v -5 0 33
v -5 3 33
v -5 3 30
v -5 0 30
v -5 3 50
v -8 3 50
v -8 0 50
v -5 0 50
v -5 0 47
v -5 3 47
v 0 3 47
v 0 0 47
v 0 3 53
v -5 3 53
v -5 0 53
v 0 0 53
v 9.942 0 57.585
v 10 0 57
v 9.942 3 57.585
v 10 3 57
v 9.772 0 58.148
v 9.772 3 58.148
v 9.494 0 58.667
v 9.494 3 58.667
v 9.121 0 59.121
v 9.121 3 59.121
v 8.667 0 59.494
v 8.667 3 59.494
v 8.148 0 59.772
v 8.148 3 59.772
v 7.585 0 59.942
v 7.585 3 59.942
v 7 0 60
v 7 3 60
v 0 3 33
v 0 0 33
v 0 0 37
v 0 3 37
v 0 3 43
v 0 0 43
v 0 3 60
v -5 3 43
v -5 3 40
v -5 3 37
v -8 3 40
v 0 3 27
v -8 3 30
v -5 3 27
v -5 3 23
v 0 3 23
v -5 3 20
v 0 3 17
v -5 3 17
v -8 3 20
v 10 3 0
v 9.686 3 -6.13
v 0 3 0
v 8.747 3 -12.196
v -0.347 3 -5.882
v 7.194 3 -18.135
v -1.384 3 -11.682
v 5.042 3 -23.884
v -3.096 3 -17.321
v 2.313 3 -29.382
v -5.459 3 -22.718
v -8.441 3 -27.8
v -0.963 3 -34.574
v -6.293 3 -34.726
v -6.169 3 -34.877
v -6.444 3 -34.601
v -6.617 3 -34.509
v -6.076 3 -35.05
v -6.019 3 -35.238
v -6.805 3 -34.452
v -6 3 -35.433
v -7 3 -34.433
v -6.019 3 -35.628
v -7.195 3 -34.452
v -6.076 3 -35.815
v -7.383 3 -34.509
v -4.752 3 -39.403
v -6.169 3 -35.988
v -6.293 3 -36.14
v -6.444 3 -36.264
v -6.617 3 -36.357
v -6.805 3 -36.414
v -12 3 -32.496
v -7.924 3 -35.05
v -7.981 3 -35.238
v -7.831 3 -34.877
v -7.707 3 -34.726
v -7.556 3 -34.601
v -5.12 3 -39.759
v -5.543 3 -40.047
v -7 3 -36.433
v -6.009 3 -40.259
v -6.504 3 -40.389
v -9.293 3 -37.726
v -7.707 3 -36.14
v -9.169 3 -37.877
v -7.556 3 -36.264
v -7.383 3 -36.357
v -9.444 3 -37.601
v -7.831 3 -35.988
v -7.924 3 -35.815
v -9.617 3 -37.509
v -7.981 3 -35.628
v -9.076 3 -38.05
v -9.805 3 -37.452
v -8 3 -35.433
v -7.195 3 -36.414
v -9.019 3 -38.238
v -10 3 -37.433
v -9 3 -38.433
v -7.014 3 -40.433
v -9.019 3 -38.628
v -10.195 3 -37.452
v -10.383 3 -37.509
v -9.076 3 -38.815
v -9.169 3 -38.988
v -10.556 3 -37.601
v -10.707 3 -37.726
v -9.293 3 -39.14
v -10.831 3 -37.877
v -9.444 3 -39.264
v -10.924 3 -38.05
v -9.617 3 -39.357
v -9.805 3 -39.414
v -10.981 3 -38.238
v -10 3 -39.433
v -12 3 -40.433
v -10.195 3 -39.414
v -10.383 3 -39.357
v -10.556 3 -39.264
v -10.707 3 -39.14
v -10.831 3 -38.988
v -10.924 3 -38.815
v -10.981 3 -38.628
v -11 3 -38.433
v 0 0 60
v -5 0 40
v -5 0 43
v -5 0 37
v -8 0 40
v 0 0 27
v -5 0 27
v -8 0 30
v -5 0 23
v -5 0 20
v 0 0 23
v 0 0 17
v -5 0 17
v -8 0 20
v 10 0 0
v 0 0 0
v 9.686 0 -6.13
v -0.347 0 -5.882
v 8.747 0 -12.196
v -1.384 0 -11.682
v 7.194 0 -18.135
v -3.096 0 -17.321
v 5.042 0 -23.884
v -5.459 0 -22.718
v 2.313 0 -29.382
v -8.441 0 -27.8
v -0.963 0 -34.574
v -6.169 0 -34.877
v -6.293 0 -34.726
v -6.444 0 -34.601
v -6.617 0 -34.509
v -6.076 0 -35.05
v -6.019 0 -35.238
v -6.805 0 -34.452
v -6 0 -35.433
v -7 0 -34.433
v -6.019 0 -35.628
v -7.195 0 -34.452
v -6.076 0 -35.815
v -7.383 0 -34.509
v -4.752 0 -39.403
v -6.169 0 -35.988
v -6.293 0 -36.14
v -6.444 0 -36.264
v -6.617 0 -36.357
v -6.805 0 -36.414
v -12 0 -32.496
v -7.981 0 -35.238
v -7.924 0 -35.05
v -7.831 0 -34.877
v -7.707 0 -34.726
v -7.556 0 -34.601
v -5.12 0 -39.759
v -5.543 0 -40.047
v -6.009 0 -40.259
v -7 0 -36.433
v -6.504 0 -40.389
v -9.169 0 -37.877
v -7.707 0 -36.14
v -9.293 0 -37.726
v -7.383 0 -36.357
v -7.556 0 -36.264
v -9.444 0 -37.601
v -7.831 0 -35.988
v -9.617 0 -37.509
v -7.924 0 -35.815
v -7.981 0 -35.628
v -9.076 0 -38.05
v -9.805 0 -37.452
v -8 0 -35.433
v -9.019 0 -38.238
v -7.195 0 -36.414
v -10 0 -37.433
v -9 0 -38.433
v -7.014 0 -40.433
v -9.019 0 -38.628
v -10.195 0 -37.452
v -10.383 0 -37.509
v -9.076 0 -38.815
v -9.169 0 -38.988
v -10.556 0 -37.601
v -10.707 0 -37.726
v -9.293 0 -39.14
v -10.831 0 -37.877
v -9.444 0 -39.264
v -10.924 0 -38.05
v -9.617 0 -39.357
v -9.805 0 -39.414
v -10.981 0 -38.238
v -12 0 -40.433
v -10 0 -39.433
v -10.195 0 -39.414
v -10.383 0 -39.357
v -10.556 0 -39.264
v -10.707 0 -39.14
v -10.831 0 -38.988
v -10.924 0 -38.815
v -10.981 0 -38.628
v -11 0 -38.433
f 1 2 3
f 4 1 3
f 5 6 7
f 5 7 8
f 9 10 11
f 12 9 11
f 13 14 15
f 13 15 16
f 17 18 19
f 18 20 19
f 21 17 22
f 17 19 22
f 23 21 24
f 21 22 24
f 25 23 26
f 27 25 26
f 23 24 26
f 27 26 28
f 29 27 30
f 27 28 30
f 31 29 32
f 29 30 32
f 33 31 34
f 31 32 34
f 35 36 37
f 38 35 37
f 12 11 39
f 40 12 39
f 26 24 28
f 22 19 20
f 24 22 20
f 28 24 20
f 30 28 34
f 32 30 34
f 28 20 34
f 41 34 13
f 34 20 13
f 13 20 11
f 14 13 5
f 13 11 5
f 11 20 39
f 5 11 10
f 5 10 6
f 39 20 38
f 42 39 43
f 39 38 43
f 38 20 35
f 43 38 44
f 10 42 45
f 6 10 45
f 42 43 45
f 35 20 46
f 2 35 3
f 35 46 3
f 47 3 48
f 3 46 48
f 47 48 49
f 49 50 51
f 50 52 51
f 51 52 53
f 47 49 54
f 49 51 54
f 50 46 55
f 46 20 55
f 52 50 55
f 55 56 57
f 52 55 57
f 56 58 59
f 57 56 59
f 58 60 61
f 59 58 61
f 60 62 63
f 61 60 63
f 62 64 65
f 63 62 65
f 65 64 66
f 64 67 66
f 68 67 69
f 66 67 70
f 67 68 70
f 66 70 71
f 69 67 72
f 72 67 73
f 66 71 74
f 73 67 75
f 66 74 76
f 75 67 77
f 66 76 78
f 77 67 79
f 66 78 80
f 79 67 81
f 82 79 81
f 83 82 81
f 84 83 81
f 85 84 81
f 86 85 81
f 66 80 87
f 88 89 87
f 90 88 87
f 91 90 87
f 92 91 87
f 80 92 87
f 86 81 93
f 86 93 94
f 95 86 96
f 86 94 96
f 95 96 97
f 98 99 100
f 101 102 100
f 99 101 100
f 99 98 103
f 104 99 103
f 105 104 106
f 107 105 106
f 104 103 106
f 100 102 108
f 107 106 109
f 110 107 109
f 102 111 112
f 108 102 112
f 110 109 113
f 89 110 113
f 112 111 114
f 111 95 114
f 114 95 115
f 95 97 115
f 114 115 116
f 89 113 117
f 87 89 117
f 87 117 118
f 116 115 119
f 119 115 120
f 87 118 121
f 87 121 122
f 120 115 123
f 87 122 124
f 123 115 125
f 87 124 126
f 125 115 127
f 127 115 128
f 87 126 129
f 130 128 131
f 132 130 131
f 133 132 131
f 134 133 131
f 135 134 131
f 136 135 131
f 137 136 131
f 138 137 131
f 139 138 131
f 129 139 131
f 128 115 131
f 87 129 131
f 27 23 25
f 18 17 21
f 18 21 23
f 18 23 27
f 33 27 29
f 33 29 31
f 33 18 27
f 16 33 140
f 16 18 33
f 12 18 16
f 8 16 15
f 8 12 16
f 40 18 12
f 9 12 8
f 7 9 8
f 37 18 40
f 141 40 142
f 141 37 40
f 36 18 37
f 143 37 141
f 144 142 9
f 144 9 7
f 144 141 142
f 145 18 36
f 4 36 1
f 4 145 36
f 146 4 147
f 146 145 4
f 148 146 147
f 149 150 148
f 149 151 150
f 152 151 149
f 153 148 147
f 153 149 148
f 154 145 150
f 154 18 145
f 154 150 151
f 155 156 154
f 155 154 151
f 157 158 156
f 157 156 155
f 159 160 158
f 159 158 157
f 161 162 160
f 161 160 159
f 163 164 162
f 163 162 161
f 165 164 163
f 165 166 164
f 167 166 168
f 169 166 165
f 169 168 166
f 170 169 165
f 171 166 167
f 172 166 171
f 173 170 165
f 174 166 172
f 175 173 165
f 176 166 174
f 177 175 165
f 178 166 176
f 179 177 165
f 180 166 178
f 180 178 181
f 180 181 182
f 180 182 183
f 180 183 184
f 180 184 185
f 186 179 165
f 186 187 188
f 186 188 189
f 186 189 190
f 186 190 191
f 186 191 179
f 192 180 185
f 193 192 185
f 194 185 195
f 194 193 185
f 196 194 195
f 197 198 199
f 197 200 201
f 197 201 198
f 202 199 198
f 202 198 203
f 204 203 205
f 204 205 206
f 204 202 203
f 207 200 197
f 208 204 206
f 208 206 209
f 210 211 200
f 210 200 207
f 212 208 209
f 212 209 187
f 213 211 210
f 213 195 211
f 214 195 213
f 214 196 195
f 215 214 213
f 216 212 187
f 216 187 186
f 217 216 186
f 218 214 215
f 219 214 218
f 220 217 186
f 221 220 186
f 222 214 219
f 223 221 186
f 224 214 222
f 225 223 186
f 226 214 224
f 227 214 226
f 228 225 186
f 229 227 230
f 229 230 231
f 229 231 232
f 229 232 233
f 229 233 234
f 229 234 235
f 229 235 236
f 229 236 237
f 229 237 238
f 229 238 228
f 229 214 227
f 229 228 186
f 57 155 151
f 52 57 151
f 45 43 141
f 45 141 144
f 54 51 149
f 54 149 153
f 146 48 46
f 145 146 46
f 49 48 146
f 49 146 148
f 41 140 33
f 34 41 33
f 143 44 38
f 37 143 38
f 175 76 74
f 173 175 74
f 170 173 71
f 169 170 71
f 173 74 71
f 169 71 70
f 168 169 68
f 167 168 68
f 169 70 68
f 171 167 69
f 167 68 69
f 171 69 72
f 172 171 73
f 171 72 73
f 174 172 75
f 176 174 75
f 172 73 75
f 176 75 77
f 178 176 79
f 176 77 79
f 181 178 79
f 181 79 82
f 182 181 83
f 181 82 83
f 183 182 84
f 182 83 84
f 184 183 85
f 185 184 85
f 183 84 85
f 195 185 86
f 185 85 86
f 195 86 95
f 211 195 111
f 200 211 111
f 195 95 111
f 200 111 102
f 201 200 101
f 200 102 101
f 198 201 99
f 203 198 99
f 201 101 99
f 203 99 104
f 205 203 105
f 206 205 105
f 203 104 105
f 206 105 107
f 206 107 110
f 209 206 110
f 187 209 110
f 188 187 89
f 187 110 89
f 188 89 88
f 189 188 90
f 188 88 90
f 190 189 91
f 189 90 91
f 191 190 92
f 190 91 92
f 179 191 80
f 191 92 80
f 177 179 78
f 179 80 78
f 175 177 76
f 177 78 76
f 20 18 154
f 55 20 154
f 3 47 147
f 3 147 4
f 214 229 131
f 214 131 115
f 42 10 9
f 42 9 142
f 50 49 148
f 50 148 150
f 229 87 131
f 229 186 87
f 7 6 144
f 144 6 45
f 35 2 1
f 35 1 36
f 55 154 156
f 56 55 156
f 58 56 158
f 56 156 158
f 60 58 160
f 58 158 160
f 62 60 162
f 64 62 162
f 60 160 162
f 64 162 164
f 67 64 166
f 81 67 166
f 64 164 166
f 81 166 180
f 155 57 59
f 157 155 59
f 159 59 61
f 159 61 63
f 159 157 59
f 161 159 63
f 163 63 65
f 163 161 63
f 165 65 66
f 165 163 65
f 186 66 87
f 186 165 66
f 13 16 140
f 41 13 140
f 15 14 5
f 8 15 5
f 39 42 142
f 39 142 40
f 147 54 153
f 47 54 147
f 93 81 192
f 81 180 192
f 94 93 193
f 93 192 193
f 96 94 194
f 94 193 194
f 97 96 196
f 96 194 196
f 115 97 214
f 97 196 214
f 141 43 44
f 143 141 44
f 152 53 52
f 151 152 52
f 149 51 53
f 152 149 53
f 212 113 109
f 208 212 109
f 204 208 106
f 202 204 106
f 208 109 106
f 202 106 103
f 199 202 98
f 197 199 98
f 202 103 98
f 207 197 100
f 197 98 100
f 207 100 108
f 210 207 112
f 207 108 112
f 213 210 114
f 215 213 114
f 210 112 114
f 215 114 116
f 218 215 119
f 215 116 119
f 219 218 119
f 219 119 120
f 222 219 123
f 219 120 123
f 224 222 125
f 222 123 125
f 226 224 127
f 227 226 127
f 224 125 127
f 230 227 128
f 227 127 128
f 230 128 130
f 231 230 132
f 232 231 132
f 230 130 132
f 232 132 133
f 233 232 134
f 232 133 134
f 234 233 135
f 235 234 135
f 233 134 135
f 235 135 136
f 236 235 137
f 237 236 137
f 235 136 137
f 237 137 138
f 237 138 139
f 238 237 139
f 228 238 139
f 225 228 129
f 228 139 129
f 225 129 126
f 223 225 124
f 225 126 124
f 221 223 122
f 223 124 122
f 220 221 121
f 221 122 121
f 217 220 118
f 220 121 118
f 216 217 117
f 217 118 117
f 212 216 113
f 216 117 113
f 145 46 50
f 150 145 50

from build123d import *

# Parameters (mm, degrees)
SKETCH1_R              = 50
BOSS_EXTRUDE1_DEPTH    = 3
SPLIT1_SURFACE_1_BACK  = 170.732
SPLIT1_SURFACE_1_DEPTH = 341.464
SPLIT1_SURFACE_2_BACK  = 170.732
SPLIT1_SURFACE_2_DEPTH = 341.464
BODY_DELETE1_DEPTH     = 3
FILLET1_R              = 3
BOSS_EXTRUDE4_DEPTH    = 3
SPLIT2_SURFACE_3_BACK  = 109.724
SPLIT2_SURFACE_3_DEPTH = 219.448
SPLIT2_SURFACE_4_BACK  = 109.724
SPLIT2_SURFACE_4_DEPTH = 219.448
FILLET2_R              = 3
SKETCH5_R              = 1
CUT_EXTRUDE1_DEPTH     = 3
SKETCH6_W              = 8
SKETCH6_H              = 5
BOSS_EXTRUDE5_DEPTH    = 3
SKETCH7_W              = 5
SKETCH7_H              = 4
CUT_EXTRUDE2_DEPTH     = 3


# Read off the part's stored shape, not the designer's step: Body-Delete1
with BuildPart() as part:
    # Sketch1 → Boss-Extrude1 (new body)
    with BuildSketch(Plane(origin=(0, 0, 0), x_dir=(1, 0, 0), z_dir=(0, 1, 0))):
        with BuildLine():
            ThreePointArc((10, 0), (-107.445626465, 17.320508076), (0, -33.166247904))
            Line((0, -33.166247904), (0, -60))
            Line((0, -60), (10, -60))
            Line((10, -60), (10, 0))
        make_face()
        with Locations(Location((-50, 0, 0), (0, 0, 270))):
            Circle(SKETCH1_R, mode=Mode.SUBTRACT)
    extrude(amount=BOSS_EXTRUDE1_DEPTH)


with BuildPart() as body_2:
    # Split1: the piece behind the surface
    add(part.part)
    # Split1 surface: a surface, the sketch's curves swept straight by 341.464 mm
    with BuildLine(Plane(origin=(0, 3, 0), x_dir=(1, 0, 0), z_dir=(0, 1, 0)).offset(-SPLIT1_SURFACE_1_BACK), mode=Mode.PRIVATE) as split1_surface_1_path:
        Line((0, -33.166247904), (0, 0))
        Line((0, 0), (-12, 0))
        Line((-12, 0), (-12, 32.496153619))
        Line((-12, 32.496153619), (-12, 67.159700612))
        Line((-12, 67.159700612), (-127.638562935, 67.159700612))
        Line((-127.638562935, 67.159700612), (-127.638562935, -72.196904976))
        Line((-127.638562935, -72.196904976), (0, -72.196904976))
        Line((0, -72.196904976), (0, -33.166247904))
    split1_surface_1 = Shell.extrude(split1_surface_1_path.wire(), (0 * SPLIT1_SURFACE_1_DEPTH, 1 * SPLIT1_SURFACE_1_DEPTH, 0 * SPLIT1_SURFACE_1_DEPTH))
    split(bisect_by=split1_surface_1, keep=Keep.BOTTOM)

    # Fillet1
    fillet1_edges = [body_2.edges().sort_by_distance(p)[0] for p in [
        (10, 1.5, 60),
    ]]
    fillet(fillet1_edges, radius=FILLET1_R)

    # Sketch3 → Boss-Extrude4 (add)
    with BuildSketch(Plane(origin=(0, 3, 0), x_dir=(1, 0, 0), z_dir=(0, 1, 0))):
        Polygon((0, -50), (-8, -50), (-8, -40), (0, -40), (3, -40), (3, -50), align=None)
        Polygon((-8, -20), (-8, -30), (0, -30), (3, -30), (3, -20), (0, -20), align=None)
    extrude(amount=-BOSS_EXTRUDE4_DEPTH)


with BuildPart() as part_1:
    add(part.part)

    # Split1: split by a surface, the side it looks to stays
    # Split1 surface: a surface, the sketch's curves swept straight by 341.464 mm
    with BuildLine(Plane(origin=(0, 3, 0), x_dir=(1, 0, 0), z_dir=(0, 1, 0)).offset(-SPLIT1_SURFACE_2_BACK), mode=Mode.PRIVATE) as split1_surface_2_path:
        Line((0, -33.166247904), (0, 0))
        Line((0, 0), (-12, 0))
        Line((-12, 0), (-12, 32.496153619))
        Line((-12, 32.496153619), (-12, 67.159700612))
        Line((-12, 67.159700612), (-127.638562935, 67.159700612))
        Line((-127.638562935, 67.159700612), (-127.638562935, -72.196904976))
        Line((-127.638562935, -72.196904976), (0, -72.196904976))
        Line((0, -72.196904976), (0, -33.166247904))
    split1_surface_2 = Shell.extrude(split1_surface_2_path.wire(), (0 * SPLIT1_SURFACE_2_DEPTH, 1 * SPLIT1_SURFACE_2_DEPTH, 0 * SPLIT1_SURFACE_2_DEPTH))
    split(bisect_by=split1_surface_2, keep=Keep.TOP)

    # Body-Delete1 outline → Body-Delete1 (cut)
    with BuildSketch(Plane(origin=(0, 0, 0), x_dir=(1, 0, 0), z_dir=(0, 1, 0))):
        with BuildLine():
            ThreePointArc((-12, 46.432747065), (-109.329587897, -8.94427191), (0, -33.166247904))
            Line((0, -33.166247904), (0, 0))
            ThreePointArc((0, 0), (-96.904157598, -17.320508075), (-12, 32.496153619))
            Line((-12, 32.496153619), (-12, 46.432747065))
        make_face()
    extrude(amount=BODY_DELETE1_DEPTH, mode=Mode.SUBTRACT)


with BuildPart() as body_2_2:
    # Split2: the piece behind the surface
    add(body_2.part)
    # Split2 surface: a surface, the sketch's curves swept straight by 219.448 mm
    with BuildLine(Plane(origin=(0, 3, 0), x_dir=(1, 0, 0), z_dir=(0, 1, 0)).offset(-SPLIT2_SURFACE_3_BACK), mode=Mode.PRIVATE) as split2_surface_3_path:
        Line((-12, 40.432747065), (-5.669502994, 40.432747065))
        Line((-5.669502994, 40.432747065), (-5.042290504, 40.432747065))
        Line((-5.042290504, 40.432747065), (-5.042290504, 47.453598883))
        Line((-5.042290504, 47.453598883), (-14.646815791, 47.453598883))
        Line((-14.646815791, 47.453598883), (-14.646815791, 40.432747065))
        Line((-14.646815791, 40.432747065), (-12, 40.432747065))
    split2_surface_3 = Shell.extrude(split2_surface_3_path.wire(), (0 * SPLIT2_SURFACE_3_DEPTH, 1 * SPLIT2_SURFACE_3_DEPTH, 0 * SPLIT2_SURFACE_3_DEPTH))
    split(bisect_by=split2_surface_3, keep=Keep.BOTTOM)

    # Fillet2
    fillet2_edges = [body_2_2.edges().sort_by_distance(p)[0] for p in [
        (-5.669502994, 1.5, -40.432747065),
    ]]
    fillet(fillet2_edges, radius=FILLET2_R)

    # Sketch5 → Cut-Extrude1 (cut)
    with BuildSketch(Plane(origin=(0, 3, 0), x_dir=(1, 0, 0), z_dir=(0, 1, 0))):
        with Locations(Location((-10, 38.432747065, 0), (0, 0, 270))):
            Circle(SKETCH5_R)
        with Locations(Location((-7, 35.432747065, 0), (0, 0, 270))):
            Circle(SKETCH5_R)
    extrude(amount=-CUT_EXTRUDE1_DEPTH, mode=Mode.SUBTRACT)

    # Sketch6 → Boss-Extrude5 (add)
    with BuildSketch(Plane(origin=(0, 3, 0), x_dir=(1, 0, 0), z_dir=(0, 1, 0))):
        with Locations((-1, -39.5)):
            Rectangle(SKETCH6_W, SKETCH6_H)
        with Locations((-1, -50.5)):
            Rectangle(SKETCH6_W, SKETCH6_H)
        with Locations((-1, -19.5)):
            Rectangle(SKETCH6_W, SKETCH6_H)
        with Locations((-1, -30.5)):
            Rectangle(SKETCH6_W, SKETCH6_H)
    extrude(amount=-BOSS_EXTRUDE5_DEPTH)

    # Sketch7 → Cut-Extrude2 (cut)
    with BuildSketch(Plane(origin=(0, 3, 0), x_dir=(1, 0, 0), z_dir=(0, 1, 0))):
        with Locations((-2.5, -25)):
            Rectangle(SKETCH7_W, SKETCH7_H)
        with Locations((-2.5, -45)):
            Rectangle(SKETCH7_W, SKETCH7_H)
    extrude(amount=-CUT_EXTRUDE2_DEPTH, mode=Mode.SUBTRACT)


with BuildPart() as body_2_1:
    add(body_2.part)

    # Split2: split by a surface, the side it looks to stays
    # Split2 surface: a surface, the sketch's curves swept straight by 219.448 mm
    with BuildLine(Plane(origin=(0, 3, 0), x_dir=(1, 0, 0), z_dir=(0, 1, 0)).offset(-SPLIT2_SURFACE_4_BACK), mode=Mode.PRIVATE) as split2_surface_4_path:
        Line((-12, 40.432747065), (-5.669502994, 40.432747065))
        Line((-5.669502994, 40.432747065), (-5.042290504, 40.432747065))
        Line((-5.042290504, 40.432747065), (-5.042290504, 47.453598883))
        Line((-5.042290504, 47.453598883), (-14.646815791, 47.453598883))
        Line((-14.646815791, 47.453598883), (-14.646815791, 40.432747065))
        Line((-14.646815791, 40.432747065), (-12, 40.432747065))
    split2_surface_4 = Shell.extrude(split2_surface_4_path.wire(), (0 * SPLIT2_SURFACE_4_DEPTH, 1 * SPLIT2_SURFACE_4_DEPTH, 0 * SPLIT2_SURFACE_4_DEPTH))
    split(bisect_by=split2_surface_4, keep=Keep.TOP)


solid = body_2_2.part
